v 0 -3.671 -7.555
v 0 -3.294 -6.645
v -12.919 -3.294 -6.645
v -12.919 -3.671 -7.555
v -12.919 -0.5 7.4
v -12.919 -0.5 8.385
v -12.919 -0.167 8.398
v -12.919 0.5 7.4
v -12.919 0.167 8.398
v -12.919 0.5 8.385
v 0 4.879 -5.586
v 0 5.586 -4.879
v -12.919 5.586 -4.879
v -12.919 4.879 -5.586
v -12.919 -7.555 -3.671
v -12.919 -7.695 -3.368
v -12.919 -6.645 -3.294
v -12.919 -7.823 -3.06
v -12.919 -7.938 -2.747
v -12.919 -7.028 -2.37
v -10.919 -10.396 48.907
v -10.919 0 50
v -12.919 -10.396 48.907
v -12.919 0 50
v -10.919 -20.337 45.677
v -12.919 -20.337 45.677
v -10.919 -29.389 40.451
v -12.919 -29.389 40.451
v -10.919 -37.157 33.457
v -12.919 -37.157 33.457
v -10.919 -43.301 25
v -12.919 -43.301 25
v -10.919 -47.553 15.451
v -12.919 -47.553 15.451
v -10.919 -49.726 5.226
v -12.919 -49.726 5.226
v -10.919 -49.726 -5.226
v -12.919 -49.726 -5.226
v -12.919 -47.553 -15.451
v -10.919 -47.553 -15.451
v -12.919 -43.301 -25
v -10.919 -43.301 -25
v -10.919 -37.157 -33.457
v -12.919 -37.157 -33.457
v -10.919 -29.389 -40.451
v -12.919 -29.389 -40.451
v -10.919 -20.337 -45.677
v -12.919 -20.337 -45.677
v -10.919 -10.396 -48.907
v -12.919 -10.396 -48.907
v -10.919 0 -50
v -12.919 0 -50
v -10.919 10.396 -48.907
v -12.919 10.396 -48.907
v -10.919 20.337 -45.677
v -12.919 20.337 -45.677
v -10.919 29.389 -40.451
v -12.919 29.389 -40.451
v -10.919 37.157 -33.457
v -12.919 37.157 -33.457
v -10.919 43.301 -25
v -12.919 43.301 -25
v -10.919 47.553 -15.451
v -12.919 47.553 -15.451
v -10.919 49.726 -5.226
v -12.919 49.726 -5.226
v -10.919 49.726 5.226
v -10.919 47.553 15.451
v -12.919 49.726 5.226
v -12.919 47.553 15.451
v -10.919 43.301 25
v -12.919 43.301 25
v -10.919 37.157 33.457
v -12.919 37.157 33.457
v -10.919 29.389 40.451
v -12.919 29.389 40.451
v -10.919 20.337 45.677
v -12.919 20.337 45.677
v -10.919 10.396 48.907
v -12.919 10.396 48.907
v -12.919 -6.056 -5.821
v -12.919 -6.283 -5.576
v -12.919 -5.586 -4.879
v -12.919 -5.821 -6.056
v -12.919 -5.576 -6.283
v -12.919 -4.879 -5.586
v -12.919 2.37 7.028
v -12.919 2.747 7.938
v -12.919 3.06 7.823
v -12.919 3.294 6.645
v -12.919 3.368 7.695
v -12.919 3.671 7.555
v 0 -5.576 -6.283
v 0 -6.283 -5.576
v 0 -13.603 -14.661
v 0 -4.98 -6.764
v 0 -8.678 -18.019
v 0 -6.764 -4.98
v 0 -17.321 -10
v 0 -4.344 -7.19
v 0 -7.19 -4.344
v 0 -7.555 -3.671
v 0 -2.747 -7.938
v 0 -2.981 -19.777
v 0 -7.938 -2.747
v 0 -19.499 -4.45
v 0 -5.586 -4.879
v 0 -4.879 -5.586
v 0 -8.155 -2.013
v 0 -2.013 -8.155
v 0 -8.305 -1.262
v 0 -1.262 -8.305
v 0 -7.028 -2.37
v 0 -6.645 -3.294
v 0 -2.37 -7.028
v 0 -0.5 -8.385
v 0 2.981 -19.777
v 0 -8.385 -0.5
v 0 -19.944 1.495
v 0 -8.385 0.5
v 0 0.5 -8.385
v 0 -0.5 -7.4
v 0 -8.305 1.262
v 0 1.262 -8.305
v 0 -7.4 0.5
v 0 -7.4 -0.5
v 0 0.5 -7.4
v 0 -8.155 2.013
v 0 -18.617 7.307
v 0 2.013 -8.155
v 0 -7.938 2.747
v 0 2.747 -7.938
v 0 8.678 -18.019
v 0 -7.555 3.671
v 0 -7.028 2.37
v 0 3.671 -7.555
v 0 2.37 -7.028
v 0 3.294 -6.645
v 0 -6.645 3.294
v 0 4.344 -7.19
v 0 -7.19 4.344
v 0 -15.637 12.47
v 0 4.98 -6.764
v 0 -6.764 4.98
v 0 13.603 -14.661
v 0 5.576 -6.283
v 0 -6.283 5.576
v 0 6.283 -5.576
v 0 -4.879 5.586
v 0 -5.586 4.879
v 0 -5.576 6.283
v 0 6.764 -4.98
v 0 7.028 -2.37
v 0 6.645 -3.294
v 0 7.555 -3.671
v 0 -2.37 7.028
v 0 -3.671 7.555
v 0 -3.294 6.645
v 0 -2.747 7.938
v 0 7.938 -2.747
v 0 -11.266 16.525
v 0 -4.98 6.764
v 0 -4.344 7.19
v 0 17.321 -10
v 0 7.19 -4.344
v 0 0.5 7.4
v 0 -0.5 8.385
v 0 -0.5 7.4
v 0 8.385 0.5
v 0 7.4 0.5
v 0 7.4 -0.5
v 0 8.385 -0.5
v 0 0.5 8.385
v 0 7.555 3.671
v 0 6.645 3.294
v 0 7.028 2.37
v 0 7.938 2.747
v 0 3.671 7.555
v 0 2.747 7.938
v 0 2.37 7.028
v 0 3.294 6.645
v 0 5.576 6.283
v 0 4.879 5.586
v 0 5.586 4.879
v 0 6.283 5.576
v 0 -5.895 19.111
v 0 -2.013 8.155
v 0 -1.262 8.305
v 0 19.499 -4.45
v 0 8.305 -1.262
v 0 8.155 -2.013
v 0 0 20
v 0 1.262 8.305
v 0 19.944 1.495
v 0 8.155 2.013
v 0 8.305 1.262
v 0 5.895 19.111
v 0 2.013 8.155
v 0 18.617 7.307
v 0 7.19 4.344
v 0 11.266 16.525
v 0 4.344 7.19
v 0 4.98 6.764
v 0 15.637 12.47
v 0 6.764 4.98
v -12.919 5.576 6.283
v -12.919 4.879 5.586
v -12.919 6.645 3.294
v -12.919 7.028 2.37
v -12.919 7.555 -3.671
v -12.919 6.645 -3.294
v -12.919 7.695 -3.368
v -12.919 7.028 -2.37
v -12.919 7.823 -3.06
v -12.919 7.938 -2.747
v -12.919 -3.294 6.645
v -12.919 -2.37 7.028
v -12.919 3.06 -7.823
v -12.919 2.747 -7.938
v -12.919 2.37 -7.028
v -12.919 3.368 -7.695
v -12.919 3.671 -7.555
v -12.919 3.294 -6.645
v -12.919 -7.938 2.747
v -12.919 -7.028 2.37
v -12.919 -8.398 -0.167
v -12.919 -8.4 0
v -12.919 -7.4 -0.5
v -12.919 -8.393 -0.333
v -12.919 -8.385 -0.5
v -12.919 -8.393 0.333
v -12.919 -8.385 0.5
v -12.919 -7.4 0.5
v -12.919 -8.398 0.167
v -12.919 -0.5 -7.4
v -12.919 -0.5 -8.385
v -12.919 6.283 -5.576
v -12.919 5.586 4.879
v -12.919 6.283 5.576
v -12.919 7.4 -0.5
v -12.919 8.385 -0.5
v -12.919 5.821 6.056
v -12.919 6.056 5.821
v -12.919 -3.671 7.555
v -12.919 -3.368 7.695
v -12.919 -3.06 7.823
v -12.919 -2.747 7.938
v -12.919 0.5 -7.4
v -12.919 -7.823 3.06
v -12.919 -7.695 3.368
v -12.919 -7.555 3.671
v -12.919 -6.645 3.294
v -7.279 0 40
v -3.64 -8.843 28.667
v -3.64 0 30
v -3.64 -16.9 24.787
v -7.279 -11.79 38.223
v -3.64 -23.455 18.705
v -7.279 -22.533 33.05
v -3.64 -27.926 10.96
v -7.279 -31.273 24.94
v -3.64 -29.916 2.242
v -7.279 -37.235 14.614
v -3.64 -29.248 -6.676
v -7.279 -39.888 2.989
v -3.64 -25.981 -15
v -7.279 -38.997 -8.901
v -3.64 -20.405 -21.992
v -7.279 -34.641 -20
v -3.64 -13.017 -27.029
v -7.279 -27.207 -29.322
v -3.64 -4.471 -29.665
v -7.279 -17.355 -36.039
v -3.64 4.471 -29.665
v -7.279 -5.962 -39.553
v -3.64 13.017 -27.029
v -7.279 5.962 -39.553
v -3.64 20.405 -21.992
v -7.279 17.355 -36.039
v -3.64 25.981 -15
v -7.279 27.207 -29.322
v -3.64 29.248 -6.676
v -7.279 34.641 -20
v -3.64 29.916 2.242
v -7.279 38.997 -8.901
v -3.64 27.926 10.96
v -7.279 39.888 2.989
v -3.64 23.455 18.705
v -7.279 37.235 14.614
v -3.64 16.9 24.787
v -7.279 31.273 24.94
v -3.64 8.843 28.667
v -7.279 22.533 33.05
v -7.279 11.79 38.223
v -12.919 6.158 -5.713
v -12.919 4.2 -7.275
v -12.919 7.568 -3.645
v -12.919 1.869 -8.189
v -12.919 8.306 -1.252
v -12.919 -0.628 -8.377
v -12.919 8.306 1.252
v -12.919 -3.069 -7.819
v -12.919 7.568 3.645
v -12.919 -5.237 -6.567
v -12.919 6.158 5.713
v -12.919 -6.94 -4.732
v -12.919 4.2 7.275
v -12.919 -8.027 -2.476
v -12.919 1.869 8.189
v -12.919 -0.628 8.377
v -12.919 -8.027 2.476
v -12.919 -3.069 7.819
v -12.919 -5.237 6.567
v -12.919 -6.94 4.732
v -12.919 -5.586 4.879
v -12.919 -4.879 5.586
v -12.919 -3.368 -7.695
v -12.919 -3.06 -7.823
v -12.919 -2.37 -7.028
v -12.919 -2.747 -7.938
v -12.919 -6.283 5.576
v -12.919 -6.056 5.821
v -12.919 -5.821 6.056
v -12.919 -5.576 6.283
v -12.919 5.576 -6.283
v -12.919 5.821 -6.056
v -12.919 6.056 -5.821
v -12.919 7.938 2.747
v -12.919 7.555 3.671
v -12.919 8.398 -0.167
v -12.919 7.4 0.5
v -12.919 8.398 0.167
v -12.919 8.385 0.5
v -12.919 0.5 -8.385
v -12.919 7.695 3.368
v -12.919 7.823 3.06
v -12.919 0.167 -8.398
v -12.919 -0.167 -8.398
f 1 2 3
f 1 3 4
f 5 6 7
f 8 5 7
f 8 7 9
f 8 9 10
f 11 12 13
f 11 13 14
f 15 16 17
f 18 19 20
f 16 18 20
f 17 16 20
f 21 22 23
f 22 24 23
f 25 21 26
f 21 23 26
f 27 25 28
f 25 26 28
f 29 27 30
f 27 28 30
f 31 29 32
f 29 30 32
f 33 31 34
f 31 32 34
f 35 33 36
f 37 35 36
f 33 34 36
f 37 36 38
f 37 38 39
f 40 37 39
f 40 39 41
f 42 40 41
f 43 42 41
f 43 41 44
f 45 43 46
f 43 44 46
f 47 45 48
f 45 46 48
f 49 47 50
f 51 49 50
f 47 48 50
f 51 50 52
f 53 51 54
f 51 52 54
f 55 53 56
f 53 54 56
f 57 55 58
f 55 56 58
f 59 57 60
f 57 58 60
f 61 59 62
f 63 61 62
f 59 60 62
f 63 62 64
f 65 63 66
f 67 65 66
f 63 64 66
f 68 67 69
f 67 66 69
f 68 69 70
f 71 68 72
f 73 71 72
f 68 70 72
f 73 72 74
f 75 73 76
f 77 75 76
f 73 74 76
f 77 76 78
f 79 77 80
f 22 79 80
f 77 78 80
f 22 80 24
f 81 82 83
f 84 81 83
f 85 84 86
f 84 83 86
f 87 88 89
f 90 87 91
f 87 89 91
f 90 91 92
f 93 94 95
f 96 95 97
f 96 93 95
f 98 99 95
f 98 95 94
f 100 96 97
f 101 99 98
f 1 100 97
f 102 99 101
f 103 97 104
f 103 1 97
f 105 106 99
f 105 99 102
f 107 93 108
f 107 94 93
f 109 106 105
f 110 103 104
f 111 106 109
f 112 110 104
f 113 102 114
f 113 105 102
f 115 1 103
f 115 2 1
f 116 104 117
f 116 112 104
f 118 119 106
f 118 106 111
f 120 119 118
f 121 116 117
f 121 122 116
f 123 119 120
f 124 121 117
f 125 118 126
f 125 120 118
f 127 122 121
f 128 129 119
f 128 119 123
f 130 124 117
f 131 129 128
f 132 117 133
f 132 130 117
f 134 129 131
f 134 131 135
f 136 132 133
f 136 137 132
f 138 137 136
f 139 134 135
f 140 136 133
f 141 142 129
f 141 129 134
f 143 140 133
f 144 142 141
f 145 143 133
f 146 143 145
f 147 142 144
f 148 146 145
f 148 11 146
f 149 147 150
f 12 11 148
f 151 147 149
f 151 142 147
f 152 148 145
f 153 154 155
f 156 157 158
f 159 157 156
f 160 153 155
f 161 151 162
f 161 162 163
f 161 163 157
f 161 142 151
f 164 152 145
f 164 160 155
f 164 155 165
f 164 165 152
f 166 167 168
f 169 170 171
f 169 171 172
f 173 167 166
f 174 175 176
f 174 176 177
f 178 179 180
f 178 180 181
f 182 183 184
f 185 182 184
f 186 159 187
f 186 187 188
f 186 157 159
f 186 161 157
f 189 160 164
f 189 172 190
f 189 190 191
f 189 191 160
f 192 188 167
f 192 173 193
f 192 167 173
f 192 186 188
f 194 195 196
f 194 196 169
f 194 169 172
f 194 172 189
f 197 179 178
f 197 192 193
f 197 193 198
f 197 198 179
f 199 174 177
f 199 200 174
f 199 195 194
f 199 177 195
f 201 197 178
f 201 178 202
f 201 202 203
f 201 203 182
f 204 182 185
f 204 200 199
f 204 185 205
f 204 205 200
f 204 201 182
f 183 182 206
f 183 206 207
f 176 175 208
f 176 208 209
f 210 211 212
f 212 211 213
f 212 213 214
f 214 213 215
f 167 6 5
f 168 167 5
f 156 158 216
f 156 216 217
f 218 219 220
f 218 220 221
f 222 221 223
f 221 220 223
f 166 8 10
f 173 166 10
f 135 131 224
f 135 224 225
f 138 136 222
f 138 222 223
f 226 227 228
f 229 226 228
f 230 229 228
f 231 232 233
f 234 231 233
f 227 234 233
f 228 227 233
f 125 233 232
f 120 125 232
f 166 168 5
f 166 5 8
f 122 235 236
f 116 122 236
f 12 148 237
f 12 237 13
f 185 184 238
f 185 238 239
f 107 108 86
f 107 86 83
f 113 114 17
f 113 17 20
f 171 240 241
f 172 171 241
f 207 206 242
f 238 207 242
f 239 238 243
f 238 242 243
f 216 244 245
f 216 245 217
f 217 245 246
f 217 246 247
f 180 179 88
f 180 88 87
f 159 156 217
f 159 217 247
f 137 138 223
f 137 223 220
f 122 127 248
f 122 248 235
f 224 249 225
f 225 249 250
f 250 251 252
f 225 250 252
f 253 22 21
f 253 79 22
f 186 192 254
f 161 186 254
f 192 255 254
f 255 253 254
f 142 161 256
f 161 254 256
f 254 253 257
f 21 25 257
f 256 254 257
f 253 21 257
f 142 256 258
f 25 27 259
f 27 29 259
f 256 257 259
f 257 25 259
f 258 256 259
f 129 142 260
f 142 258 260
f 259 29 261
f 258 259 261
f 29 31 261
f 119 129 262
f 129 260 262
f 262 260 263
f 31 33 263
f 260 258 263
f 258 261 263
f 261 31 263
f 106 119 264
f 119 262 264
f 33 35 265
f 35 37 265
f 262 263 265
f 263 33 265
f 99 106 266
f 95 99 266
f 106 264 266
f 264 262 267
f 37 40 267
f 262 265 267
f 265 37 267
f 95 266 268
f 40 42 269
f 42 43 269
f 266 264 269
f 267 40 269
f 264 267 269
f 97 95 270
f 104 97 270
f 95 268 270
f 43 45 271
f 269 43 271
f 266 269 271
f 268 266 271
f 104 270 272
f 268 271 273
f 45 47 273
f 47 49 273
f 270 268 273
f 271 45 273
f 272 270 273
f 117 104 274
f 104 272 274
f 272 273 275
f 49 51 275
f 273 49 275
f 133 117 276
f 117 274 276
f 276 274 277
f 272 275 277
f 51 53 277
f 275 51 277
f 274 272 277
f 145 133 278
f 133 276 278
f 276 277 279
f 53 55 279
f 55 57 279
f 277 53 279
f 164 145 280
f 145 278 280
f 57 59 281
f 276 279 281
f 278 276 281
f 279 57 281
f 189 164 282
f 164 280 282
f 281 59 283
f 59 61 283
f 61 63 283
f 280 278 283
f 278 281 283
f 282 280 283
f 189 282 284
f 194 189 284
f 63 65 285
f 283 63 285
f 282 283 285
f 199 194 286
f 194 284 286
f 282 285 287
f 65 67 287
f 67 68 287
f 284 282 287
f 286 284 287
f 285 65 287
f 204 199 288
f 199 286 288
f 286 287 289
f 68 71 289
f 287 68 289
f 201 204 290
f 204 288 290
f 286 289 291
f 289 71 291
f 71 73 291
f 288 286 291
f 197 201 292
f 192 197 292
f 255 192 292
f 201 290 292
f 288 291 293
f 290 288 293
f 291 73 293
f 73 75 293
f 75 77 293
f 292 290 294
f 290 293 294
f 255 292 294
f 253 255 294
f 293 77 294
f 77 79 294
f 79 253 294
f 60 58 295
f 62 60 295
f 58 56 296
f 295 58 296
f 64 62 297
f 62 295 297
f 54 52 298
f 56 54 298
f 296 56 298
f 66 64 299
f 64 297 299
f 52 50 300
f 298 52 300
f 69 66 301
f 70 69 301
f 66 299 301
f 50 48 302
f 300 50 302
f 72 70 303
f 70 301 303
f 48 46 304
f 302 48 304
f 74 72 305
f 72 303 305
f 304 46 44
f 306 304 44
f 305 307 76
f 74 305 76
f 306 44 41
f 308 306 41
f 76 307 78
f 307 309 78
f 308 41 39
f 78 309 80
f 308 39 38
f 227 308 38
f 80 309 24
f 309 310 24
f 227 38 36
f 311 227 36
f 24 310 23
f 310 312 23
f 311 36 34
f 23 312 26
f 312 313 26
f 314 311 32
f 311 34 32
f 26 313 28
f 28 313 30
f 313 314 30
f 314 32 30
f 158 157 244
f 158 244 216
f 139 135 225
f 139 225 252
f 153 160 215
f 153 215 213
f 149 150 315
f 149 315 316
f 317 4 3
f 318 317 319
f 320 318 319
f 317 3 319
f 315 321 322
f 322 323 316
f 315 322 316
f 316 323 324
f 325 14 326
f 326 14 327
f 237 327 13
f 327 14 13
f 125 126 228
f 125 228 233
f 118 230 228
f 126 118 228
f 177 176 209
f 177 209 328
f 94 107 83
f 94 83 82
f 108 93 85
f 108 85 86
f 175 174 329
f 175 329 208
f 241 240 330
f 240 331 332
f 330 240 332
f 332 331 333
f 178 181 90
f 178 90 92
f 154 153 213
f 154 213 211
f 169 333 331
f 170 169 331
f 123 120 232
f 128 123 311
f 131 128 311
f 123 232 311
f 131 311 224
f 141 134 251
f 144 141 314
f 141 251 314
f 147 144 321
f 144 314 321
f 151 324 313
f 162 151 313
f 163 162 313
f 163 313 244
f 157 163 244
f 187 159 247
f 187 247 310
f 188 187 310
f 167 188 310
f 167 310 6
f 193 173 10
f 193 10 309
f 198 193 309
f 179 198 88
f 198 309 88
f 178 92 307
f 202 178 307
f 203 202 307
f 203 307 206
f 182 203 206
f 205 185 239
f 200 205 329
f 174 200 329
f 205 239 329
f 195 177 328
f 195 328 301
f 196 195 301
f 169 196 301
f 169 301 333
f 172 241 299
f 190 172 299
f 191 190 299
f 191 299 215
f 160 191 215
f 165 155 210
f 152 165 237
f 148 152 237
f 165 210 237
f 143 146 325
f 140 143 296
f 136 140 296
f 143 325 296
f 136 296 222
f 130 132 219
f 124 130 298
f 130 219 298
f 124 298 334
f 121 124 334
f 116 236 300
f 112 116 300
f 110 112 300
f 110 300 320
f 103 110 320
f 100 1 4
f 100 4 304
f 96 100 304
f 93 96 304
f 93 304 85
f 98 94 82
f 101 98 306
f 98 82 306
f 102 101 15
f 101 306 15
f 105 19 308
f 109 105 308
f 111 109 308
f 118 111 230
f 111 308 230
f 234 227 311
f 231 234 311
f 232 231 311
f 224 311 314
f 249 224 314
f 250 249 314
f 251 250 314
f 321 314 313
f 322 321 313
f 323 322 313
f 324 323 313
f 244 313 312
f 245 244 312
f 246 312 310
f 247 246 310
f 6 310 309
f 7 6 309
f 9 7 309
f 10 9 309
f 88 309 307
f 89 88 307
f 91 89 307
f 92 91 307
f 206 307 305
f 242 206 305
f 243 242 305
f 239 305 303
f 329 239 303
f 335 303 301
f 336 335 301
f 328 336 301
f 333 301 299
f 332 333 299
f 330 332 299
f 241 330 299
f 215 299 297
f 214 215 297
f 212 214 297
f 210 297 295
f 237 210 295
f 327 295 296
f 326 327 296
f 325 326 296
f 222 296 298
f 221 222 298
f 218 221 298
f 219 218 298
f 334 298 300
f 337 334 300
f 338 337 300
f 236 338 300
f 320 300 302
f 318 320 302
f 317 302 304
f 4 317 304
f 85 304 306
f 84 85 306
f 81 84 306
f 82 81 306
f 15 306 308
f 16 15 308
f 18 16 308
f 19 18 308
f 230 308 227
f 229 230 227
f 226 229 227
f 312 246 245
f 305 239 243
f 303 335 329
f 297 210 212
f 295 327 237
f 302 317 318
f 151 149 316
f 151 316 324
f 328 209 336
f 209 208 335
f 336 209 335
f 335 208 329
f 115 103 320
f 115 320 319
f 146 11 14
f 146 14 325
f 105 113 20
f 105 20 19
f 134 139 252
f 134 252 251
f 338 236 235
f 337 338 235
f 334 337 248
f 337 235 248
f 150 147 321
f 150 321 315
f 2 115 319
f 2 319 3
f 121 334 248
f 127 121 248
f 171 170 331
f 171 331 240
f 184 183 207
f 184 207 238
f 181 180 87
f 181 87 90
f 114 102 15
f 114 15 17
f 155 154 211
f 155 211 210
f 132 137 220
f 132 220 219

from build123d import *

# Parameters (mm, degrees)
F3_D     = 16.8
F5_DEPTH = 12.919


with BuildPart() as f1:
    # F0 (on Front) → F1 (revolve)
    with BuildSketch(Plane.XZ):
        Polygon((-12.919107028, 0), (0, 0), (0, 20), (-10.919107028, 50), (-12.919107028, 50), align=None)
    revolve(axis=Axis((-6.459553514, 0, 0), (1, 0, 0)))

    # F3 (through all)
    with Locations(Plane.YZ):
        with Locations((0, 0)):
            Hole(F3_D / 2)

    # F4 (on Right) → F5 (join)
    with BuildSketch(Plane.YZ):
        with BuildLine():
            Line((0.5, 7.4), (0.5, 8.3851058431))
            ThreePointArc((0.5, 8.3851058431), (0, 8.4), (-0.5, 8.3851058431))
            Line((-0.5, 8.3851058431), (-0.5, 7.4))
            Line((-0.5, 7.4), (0.5, 7.4))
        make_face()
        with BuildLine():
            Line((-2.3699176332, 7.0280502568), (-2.7469013185, 7.9381693826))
            ThreePointArc((-2.7469013185, 7.9381693826), (-3.2145408319, 7.7605880731), (-3.670780851, 7.5554859502))
            Line((-3.670780851, 7.5554859502), (-3.2937971658, 6.6453668244))
            Line((-3.2937971658, 6.6453668244), (-2.3699176332, 7.0280502568))
        make_face()
        with BuildLine():
            Line((-4.8790367902, 5.5861435714), (-5.575611812, 6.2827185932))
            ThreePointArc((-5.575611812, 6.2827185932), (-5.939696962, 5.939696962), (-6.2827185932, 5.575611812))
            Line((-6.2827185932, 5.575611812), (-5.5861435714, 4.8790367902))
            Line((-5.5861435714, 4.8790367902), (-4.8790367902, 5.5861435714))
        make_face()
        with BuildLine():
            Line((-6.6453668244, 3.2937971658), (-7.5554859502, 3.670780851))
            ThreePointArc((-7.5554859502, 3.670780851), (-7.7605880731, 3.2145408319), (-7.9381693826, 2.7469013185))
            Line((-7.9381693826, 2.7469013185), (-7.0280502568, 2.3699176332))
            Line((-7.0280502568, 2.3699176332), (-6.6453668244, 3.2937971658))
        make_face()
        with BuildLine():
            Line((-7.4, 0.5), (-8.3851058431, 0.5))
            ThreePointArc((-8.3851058431, 0.5), (-8.4, 0), (-8.3851058431, -0.5))
            Line((-8.3851058431, -0.5), (-7.4, -0.5))
            Line((-7.4, -0.5), (-7.4, 0.5))
        make_face()
        with BuildLine():
            Line((-7.0280502568, -2.3699176332), (-7.9381693826, -2.7469013185))
            ThreePointArc((-7.9381693826, -2.7469013185), (-7.7605880731, -3.2145408319), (-7.5554859502, -3.670780851))
            Line((-7.5554859502, -3.670780851), (-6.6453668244, -3.2937971658))
            Line((-6.6453668244, -3.2937971658), (-7.0280502568, -2.3699176332))
        make_face()
        with BuildLine():
            Line((-5.5861435714, -4.8790367902), (-6.2827185932, -5.575611812))
            ThreePointArc((-6.2827185932, -5.575611812), (-5.939696962, -5.939696962), (-5.575611812, -6.2827185932))
            Line((-5.575611812, -6.2827185932), (-4.8790367902, -5.5861435714))
            Line((-4.8790367902, -5.5861435714), (-5.5861435714, -4.8790367902))
        make_face()
        with BuildLine():
            Line((-3.2937971658, -6.6453668244), (-3.670780851, -7.5554859502))
            ThreePointArc((-3.670780851, -7.5554859502), (-3.2145408319, -7.7605880731), (-2.7469013185, -7.9381693826))
            Line((-2.7469013185, -7.9381693826), (-2.3699176332, -7.0280502568))
            Line((-2.3699176332, -7.0280502568), (-3.2937971658, -6.6453668244))
        make_face()
        with BuildLine():
            Line((-0.5, -7.4), (-0.5, -8.3851058431))
            ThreePointArc((-0.5, -8.3851058431), (0, -8.4), (0.5, -8.3851058431))
            Line((0.5, -8.3851058431), (0.5, -7.4))
            Line((0.5, -7.4), (-0.5, -7.4))
        make_face()
        with BuildLine():
            Line((2.3699176332, -7.0280502568), (2.7469013185, -7.9381693826))
            ThreePointArc((2.7469013185, -7.9381693826), (3.2145408319, -7.7605880731), (3.670780851, -7.5554859502))
            Line((3.670780851, -7.5554859502), (3.2937971658, -6.6453668244))
            Line((3.2937971658, -6.6453668244), (2.3699176332, -7.0280502568))
        make_face()
        with BuildLine():
            Line((4.8790367902, -5.5861435714), (5.575611812, -6.2827185932))
            ThreePointArc((5.575611812, -6.2827185932), (5.939696962, -5.939696962), (6.2827185932, -5.575611812))
            Line((6.2827185932, -5.575611812), (5.5861435714, -4.8790367902))
            Line((5.5861435714, -4.8790367902), (4.8790367902, -5.5861435714))
        make_face()
        with BuildLine():
            Line((6.6453668244, -3.2937971658), (7.5554859502, -3.670780851))
            ThreePointArc((7.5554859502, -3.670780851), (7.7605880731, -3.2145408319), (7.9381693826, -2.7469013185))
            Line((7.9381693826, -2.7469013185), (7.0280502568, -2.3699176332))
            Line((7.0280502568, -2.3699176332), (6.6453668244, -3.2937971658))
        make_face()
        with BuildLine():
            Line((7.4, -0.5), (8.3851058431, -0.5))
            ThreePointArc((8.3851058431, -0.5), (8.4, 0), (8.3851058431, 0.5))
            Line((8.3851058431, 0.5), (7.4, 0.5))
            Line((7.4, 0.5), (7.4, -0.5))
        make_face()
        with BuildLine():
            Line((7.0280502568, 2.3699176332), (7.9381693826, 2.7469013185))
            ThreePointArc((7.9381693826, 2.7469013185), (7.7605880731, 3.2145408319), (7.5554859502, 3.670780851))
            Line((7.5554859502, 3.670780851), (6.6453668244, 3.2937971658))
            Line((6.6453668244, 3.2937971658), (7.0280502568, 2.3699176332))
        make_face()
        with BuildLine():
            Line((5.5861435714, 4.8790367902), (6.2827185932, 5.575611812))
            ThreePointArc((6.2827185932, 5.575611812), (5.939696962, 5.939696962), (5.575611812, 6.2827185932))
            Line((5.575611812, 6.2827185932), (4.8790367902, 5.5861435714))
            Line((4.8790367902, 5.5861435714), (5.5861435714, 4.8790367902))
        make_face()
        with BuildLine():
            Line((3.2937971658, 6.6453668244), (3.670780851, 7.5554859502))
            ThreePointArc((3.670780851, 7.5554859502), (3.2145408319, 7.7605880731), (2.7469013185, 7.9381693826))
            Line((2.7469013185, 7.9381693826), (2.3699176332, 7.0280502568))
            Line((2.3699176332, 7.0280502568), (3.2937971658, 6.6453668244))
        make_face()
    extrude(amount=-F5_DEPTH)


solid = f1.part
